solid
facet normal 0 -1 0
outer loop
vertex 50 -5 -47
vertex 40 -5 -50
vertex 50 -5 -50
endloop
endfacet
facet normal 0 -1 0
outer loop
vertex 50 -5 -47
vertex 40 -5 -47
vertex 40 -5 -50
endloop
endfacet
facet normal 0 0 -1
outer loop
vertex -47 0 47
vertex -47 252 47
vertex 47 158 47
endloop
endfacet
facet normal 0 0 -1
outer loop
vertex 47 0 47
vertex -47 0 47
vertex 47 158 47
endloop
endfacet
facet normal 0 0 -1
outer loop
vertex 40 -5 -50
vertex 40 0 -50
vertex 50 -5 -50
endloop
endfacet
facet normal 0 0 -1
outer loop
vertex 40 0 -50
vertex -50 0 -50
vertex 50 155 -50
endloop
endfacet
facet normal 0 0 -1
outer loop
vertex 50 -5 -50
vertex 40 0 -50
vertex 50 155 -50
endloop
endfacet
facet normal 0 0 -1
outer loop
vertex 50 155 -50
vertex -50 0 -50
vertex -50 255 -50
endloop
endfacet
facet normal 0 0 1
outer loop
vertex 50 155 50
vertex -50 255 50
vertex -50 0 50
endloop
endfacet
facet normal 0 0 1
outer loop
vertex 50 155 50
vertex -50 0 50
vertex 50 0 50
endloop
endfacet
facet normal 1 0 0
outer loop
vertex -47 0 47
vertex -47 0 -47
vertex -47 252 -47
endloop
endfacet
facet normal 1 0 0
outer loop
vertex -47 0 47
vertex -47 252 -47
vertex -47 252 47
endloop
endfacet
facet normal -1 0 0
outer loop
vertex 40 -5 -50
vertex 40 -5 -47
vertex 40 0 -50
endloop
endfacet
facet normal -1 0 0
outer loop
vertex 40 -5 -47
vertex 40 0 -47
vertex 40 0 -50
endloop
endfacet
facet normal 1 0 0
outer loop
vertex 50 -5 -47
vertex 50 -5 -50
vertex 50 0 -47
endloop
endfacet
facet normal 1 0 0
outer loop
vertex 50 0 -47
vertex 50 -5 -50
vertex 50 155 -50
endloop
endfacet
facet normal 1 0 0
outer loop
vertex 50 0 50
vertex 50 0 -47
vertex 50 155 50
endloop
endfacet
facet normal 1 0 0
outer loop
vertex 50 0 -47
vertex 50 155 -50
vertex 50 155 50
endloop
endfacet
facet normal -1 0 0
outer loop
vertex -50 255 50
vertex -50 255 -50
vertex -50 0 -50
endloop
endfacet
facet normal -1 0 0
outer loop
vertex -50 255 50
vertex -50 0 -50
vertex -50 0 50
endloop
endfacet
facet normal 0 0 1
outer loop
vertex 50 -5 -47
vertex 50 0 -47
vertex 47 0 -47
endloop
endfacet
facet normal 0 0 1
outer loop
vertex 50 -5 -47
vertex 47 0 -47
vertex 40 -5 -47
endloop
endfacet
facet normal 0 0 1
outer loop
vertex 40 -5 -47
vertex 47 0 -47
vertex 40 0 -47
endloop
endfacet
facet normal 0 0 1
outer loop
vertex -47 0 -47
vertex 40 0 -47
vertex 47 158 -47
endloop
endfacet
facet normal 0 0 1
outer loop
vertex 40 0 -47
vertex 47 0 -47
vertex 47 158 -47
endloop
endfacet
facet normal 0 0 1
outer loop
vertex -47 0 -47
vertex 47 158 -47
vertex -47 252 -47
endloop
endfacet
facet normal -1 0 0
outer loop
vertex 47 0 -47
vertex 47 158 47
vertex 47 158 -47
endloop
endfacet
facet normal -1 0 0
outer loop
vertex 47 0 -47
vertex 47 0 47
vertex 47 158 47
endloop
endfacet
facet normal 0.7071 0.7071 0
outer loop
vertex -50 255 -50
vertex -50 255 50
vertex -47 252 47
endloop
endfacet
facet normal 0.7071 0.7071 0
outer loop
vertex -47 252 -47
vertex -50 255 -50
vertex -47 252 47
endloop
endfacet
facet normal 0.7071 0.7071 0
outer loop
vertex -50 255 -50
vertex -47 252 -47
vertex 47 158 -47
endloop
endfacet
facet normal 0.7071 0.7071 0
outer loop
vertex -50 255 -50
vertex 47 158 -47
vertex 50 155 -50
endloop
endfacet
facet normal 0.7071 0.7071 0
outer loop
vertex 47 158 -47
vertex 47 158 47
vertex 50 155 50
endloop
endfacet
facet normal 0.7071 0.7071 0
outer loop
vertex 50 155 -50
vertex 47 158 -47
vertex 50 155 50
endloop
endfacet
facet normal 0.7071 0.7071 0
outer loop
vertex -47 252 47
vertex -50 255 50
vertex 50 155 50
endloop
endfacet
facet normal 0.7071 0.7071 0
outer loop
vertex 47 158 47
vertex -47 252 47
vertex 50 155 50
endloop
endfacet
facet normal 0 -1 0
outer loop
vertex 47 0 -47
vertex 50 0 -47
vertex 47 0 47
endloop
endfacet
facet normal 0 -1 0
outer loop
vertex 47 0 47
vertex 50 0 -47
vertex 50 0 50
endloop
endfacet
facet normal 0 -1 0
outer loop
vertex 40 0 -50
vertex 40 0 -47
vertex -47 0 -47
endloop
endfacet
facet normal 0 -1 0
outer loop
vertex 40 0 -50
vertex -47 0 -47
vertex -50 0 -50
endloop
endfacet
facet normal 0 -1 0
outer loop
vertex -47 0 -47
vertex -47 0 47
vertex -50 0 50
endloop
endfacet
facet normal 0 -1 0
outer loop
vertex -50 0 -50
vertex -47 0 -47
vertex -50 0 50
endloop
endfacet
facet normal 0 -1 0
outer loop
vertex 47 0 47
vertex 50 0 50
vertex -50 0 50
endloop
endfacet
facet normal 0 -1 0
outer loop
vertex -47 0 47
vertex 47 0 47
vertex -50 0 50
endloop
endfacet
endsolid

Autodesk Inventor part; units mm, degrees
ref_plane "YZ Plane" through (0, 0, 0) normal (1, 0, 0) x (0, 1, 0)
ref_plane "XZ Plane" through (0, 0, 0) normal (0, 1, 0) x (-1, 0, 0)
ref_plane "XY Plane" through (0, 0, 0) normal (0, 0, 1) x (1, 0, 0)
sketch "Sketch1" plane through (0, 0, 0) normal (0, 1, 0) x (-1, 0, 0)
  line L0 (50, 50) -> (-50, 50)
  line L1 (-50, 50) -> (-50, -50)
  line L2 (-50, -50) -> (50, -50)
  line L3 (50, -50) -> (50, 50)
  line L4 (50, 50) -> (-50, -50) construction
  line L5 (-50, 50) -> (50, -50) construction
  line L6 (47, 47) -> (-47, 47)
  line L7 (-47, 47) -> (-47, -47)
  line L8 (-47, -47) -> (47, -47)
  line L9 (47, -47) -> (47, 47)
  line L10 (47, 47) -> (-47, -47) construction
  line L11 (-47, 47) -> (47, -47) construction
  point P0 (0, 0)
  dimension "d0" = 3
  dimension "d1" = 3
  dimension "d2" = 100
  dimension "d3" = 100
extrude "Extrusion1" add sketch "Sketch1" along normal blind 255
sketch "Sketch2" plane through (-50, 0, 50) normal (0, 0, 1) x (1, 0, 0)
  line L0 (0, 0) -> (100, 0) projected
  line L1 (100, 0) -> (100, 255) projected
  line L2 (0, 255) -> (100, 255) projected
  line L3 (0, 0) -> (0, 255) projected
  line L4 (0, 255) -> (100, 155)
  point P0 (50, 0)
  dimension "d6" = 45
extrude "Extrusion2" cut sketch "Sketch2" against normal through all contours L2 L1 L4
sketch "Sketch3" plane through (0, 0, 0) normal (0, -1, 0) x (1, 0, 0)
  line L0 (-47, -47) -> (-47, 47) projected
  line L1 (-50, -50) -> (-50, 50) projected
  line L2 (-47, 25) -> (-50, 25)
  line L3 (-50, 25) -> (-50, 22)
  line L4 (-50, 22) -> (-47, 22)
  line L5 (-47, 22) -> (-47, 25)
  line L6 (50, -50) -> (50, 50) projected
  line L7 (50, -47) -> (40, -47)
  line L8 (40, -47) -> (40, -50)
  line L9 (40, -50) -> (50, -50)
  line L10 (50, -50) -> (50, -47)
  line L11 (50, 50) -> (50, -50) projected
  line L12 (-50, 50) -> (50, 50) projected
  line L13 (-50, -50) -> (-50, 50) projected
  line L14 (50, -50) -> (-50, -50) projected
  line L15 (-47, 47) -> (-47, -47) projected
  line L16 (47, 47) -> (-47, 47) projected
  line L17 (47, -47) -> (47, 47) projected
  line L18 (-47, -47) -> (47, -47) projected
  line L19 (50, -50) -> (-50, -50) projected
  point P0 (0, 0)
  point P1 (-48.5, 25)
  dimension "d9" = 10
  dimension "d10" = 3
  dimension "d11" = 25
extrude "Extrusion3" add sketch "Sketch3" along normal blind 5 contours L7 L6 L9 L8
properties part number "WI-ShaftRS3" material "Steel"
